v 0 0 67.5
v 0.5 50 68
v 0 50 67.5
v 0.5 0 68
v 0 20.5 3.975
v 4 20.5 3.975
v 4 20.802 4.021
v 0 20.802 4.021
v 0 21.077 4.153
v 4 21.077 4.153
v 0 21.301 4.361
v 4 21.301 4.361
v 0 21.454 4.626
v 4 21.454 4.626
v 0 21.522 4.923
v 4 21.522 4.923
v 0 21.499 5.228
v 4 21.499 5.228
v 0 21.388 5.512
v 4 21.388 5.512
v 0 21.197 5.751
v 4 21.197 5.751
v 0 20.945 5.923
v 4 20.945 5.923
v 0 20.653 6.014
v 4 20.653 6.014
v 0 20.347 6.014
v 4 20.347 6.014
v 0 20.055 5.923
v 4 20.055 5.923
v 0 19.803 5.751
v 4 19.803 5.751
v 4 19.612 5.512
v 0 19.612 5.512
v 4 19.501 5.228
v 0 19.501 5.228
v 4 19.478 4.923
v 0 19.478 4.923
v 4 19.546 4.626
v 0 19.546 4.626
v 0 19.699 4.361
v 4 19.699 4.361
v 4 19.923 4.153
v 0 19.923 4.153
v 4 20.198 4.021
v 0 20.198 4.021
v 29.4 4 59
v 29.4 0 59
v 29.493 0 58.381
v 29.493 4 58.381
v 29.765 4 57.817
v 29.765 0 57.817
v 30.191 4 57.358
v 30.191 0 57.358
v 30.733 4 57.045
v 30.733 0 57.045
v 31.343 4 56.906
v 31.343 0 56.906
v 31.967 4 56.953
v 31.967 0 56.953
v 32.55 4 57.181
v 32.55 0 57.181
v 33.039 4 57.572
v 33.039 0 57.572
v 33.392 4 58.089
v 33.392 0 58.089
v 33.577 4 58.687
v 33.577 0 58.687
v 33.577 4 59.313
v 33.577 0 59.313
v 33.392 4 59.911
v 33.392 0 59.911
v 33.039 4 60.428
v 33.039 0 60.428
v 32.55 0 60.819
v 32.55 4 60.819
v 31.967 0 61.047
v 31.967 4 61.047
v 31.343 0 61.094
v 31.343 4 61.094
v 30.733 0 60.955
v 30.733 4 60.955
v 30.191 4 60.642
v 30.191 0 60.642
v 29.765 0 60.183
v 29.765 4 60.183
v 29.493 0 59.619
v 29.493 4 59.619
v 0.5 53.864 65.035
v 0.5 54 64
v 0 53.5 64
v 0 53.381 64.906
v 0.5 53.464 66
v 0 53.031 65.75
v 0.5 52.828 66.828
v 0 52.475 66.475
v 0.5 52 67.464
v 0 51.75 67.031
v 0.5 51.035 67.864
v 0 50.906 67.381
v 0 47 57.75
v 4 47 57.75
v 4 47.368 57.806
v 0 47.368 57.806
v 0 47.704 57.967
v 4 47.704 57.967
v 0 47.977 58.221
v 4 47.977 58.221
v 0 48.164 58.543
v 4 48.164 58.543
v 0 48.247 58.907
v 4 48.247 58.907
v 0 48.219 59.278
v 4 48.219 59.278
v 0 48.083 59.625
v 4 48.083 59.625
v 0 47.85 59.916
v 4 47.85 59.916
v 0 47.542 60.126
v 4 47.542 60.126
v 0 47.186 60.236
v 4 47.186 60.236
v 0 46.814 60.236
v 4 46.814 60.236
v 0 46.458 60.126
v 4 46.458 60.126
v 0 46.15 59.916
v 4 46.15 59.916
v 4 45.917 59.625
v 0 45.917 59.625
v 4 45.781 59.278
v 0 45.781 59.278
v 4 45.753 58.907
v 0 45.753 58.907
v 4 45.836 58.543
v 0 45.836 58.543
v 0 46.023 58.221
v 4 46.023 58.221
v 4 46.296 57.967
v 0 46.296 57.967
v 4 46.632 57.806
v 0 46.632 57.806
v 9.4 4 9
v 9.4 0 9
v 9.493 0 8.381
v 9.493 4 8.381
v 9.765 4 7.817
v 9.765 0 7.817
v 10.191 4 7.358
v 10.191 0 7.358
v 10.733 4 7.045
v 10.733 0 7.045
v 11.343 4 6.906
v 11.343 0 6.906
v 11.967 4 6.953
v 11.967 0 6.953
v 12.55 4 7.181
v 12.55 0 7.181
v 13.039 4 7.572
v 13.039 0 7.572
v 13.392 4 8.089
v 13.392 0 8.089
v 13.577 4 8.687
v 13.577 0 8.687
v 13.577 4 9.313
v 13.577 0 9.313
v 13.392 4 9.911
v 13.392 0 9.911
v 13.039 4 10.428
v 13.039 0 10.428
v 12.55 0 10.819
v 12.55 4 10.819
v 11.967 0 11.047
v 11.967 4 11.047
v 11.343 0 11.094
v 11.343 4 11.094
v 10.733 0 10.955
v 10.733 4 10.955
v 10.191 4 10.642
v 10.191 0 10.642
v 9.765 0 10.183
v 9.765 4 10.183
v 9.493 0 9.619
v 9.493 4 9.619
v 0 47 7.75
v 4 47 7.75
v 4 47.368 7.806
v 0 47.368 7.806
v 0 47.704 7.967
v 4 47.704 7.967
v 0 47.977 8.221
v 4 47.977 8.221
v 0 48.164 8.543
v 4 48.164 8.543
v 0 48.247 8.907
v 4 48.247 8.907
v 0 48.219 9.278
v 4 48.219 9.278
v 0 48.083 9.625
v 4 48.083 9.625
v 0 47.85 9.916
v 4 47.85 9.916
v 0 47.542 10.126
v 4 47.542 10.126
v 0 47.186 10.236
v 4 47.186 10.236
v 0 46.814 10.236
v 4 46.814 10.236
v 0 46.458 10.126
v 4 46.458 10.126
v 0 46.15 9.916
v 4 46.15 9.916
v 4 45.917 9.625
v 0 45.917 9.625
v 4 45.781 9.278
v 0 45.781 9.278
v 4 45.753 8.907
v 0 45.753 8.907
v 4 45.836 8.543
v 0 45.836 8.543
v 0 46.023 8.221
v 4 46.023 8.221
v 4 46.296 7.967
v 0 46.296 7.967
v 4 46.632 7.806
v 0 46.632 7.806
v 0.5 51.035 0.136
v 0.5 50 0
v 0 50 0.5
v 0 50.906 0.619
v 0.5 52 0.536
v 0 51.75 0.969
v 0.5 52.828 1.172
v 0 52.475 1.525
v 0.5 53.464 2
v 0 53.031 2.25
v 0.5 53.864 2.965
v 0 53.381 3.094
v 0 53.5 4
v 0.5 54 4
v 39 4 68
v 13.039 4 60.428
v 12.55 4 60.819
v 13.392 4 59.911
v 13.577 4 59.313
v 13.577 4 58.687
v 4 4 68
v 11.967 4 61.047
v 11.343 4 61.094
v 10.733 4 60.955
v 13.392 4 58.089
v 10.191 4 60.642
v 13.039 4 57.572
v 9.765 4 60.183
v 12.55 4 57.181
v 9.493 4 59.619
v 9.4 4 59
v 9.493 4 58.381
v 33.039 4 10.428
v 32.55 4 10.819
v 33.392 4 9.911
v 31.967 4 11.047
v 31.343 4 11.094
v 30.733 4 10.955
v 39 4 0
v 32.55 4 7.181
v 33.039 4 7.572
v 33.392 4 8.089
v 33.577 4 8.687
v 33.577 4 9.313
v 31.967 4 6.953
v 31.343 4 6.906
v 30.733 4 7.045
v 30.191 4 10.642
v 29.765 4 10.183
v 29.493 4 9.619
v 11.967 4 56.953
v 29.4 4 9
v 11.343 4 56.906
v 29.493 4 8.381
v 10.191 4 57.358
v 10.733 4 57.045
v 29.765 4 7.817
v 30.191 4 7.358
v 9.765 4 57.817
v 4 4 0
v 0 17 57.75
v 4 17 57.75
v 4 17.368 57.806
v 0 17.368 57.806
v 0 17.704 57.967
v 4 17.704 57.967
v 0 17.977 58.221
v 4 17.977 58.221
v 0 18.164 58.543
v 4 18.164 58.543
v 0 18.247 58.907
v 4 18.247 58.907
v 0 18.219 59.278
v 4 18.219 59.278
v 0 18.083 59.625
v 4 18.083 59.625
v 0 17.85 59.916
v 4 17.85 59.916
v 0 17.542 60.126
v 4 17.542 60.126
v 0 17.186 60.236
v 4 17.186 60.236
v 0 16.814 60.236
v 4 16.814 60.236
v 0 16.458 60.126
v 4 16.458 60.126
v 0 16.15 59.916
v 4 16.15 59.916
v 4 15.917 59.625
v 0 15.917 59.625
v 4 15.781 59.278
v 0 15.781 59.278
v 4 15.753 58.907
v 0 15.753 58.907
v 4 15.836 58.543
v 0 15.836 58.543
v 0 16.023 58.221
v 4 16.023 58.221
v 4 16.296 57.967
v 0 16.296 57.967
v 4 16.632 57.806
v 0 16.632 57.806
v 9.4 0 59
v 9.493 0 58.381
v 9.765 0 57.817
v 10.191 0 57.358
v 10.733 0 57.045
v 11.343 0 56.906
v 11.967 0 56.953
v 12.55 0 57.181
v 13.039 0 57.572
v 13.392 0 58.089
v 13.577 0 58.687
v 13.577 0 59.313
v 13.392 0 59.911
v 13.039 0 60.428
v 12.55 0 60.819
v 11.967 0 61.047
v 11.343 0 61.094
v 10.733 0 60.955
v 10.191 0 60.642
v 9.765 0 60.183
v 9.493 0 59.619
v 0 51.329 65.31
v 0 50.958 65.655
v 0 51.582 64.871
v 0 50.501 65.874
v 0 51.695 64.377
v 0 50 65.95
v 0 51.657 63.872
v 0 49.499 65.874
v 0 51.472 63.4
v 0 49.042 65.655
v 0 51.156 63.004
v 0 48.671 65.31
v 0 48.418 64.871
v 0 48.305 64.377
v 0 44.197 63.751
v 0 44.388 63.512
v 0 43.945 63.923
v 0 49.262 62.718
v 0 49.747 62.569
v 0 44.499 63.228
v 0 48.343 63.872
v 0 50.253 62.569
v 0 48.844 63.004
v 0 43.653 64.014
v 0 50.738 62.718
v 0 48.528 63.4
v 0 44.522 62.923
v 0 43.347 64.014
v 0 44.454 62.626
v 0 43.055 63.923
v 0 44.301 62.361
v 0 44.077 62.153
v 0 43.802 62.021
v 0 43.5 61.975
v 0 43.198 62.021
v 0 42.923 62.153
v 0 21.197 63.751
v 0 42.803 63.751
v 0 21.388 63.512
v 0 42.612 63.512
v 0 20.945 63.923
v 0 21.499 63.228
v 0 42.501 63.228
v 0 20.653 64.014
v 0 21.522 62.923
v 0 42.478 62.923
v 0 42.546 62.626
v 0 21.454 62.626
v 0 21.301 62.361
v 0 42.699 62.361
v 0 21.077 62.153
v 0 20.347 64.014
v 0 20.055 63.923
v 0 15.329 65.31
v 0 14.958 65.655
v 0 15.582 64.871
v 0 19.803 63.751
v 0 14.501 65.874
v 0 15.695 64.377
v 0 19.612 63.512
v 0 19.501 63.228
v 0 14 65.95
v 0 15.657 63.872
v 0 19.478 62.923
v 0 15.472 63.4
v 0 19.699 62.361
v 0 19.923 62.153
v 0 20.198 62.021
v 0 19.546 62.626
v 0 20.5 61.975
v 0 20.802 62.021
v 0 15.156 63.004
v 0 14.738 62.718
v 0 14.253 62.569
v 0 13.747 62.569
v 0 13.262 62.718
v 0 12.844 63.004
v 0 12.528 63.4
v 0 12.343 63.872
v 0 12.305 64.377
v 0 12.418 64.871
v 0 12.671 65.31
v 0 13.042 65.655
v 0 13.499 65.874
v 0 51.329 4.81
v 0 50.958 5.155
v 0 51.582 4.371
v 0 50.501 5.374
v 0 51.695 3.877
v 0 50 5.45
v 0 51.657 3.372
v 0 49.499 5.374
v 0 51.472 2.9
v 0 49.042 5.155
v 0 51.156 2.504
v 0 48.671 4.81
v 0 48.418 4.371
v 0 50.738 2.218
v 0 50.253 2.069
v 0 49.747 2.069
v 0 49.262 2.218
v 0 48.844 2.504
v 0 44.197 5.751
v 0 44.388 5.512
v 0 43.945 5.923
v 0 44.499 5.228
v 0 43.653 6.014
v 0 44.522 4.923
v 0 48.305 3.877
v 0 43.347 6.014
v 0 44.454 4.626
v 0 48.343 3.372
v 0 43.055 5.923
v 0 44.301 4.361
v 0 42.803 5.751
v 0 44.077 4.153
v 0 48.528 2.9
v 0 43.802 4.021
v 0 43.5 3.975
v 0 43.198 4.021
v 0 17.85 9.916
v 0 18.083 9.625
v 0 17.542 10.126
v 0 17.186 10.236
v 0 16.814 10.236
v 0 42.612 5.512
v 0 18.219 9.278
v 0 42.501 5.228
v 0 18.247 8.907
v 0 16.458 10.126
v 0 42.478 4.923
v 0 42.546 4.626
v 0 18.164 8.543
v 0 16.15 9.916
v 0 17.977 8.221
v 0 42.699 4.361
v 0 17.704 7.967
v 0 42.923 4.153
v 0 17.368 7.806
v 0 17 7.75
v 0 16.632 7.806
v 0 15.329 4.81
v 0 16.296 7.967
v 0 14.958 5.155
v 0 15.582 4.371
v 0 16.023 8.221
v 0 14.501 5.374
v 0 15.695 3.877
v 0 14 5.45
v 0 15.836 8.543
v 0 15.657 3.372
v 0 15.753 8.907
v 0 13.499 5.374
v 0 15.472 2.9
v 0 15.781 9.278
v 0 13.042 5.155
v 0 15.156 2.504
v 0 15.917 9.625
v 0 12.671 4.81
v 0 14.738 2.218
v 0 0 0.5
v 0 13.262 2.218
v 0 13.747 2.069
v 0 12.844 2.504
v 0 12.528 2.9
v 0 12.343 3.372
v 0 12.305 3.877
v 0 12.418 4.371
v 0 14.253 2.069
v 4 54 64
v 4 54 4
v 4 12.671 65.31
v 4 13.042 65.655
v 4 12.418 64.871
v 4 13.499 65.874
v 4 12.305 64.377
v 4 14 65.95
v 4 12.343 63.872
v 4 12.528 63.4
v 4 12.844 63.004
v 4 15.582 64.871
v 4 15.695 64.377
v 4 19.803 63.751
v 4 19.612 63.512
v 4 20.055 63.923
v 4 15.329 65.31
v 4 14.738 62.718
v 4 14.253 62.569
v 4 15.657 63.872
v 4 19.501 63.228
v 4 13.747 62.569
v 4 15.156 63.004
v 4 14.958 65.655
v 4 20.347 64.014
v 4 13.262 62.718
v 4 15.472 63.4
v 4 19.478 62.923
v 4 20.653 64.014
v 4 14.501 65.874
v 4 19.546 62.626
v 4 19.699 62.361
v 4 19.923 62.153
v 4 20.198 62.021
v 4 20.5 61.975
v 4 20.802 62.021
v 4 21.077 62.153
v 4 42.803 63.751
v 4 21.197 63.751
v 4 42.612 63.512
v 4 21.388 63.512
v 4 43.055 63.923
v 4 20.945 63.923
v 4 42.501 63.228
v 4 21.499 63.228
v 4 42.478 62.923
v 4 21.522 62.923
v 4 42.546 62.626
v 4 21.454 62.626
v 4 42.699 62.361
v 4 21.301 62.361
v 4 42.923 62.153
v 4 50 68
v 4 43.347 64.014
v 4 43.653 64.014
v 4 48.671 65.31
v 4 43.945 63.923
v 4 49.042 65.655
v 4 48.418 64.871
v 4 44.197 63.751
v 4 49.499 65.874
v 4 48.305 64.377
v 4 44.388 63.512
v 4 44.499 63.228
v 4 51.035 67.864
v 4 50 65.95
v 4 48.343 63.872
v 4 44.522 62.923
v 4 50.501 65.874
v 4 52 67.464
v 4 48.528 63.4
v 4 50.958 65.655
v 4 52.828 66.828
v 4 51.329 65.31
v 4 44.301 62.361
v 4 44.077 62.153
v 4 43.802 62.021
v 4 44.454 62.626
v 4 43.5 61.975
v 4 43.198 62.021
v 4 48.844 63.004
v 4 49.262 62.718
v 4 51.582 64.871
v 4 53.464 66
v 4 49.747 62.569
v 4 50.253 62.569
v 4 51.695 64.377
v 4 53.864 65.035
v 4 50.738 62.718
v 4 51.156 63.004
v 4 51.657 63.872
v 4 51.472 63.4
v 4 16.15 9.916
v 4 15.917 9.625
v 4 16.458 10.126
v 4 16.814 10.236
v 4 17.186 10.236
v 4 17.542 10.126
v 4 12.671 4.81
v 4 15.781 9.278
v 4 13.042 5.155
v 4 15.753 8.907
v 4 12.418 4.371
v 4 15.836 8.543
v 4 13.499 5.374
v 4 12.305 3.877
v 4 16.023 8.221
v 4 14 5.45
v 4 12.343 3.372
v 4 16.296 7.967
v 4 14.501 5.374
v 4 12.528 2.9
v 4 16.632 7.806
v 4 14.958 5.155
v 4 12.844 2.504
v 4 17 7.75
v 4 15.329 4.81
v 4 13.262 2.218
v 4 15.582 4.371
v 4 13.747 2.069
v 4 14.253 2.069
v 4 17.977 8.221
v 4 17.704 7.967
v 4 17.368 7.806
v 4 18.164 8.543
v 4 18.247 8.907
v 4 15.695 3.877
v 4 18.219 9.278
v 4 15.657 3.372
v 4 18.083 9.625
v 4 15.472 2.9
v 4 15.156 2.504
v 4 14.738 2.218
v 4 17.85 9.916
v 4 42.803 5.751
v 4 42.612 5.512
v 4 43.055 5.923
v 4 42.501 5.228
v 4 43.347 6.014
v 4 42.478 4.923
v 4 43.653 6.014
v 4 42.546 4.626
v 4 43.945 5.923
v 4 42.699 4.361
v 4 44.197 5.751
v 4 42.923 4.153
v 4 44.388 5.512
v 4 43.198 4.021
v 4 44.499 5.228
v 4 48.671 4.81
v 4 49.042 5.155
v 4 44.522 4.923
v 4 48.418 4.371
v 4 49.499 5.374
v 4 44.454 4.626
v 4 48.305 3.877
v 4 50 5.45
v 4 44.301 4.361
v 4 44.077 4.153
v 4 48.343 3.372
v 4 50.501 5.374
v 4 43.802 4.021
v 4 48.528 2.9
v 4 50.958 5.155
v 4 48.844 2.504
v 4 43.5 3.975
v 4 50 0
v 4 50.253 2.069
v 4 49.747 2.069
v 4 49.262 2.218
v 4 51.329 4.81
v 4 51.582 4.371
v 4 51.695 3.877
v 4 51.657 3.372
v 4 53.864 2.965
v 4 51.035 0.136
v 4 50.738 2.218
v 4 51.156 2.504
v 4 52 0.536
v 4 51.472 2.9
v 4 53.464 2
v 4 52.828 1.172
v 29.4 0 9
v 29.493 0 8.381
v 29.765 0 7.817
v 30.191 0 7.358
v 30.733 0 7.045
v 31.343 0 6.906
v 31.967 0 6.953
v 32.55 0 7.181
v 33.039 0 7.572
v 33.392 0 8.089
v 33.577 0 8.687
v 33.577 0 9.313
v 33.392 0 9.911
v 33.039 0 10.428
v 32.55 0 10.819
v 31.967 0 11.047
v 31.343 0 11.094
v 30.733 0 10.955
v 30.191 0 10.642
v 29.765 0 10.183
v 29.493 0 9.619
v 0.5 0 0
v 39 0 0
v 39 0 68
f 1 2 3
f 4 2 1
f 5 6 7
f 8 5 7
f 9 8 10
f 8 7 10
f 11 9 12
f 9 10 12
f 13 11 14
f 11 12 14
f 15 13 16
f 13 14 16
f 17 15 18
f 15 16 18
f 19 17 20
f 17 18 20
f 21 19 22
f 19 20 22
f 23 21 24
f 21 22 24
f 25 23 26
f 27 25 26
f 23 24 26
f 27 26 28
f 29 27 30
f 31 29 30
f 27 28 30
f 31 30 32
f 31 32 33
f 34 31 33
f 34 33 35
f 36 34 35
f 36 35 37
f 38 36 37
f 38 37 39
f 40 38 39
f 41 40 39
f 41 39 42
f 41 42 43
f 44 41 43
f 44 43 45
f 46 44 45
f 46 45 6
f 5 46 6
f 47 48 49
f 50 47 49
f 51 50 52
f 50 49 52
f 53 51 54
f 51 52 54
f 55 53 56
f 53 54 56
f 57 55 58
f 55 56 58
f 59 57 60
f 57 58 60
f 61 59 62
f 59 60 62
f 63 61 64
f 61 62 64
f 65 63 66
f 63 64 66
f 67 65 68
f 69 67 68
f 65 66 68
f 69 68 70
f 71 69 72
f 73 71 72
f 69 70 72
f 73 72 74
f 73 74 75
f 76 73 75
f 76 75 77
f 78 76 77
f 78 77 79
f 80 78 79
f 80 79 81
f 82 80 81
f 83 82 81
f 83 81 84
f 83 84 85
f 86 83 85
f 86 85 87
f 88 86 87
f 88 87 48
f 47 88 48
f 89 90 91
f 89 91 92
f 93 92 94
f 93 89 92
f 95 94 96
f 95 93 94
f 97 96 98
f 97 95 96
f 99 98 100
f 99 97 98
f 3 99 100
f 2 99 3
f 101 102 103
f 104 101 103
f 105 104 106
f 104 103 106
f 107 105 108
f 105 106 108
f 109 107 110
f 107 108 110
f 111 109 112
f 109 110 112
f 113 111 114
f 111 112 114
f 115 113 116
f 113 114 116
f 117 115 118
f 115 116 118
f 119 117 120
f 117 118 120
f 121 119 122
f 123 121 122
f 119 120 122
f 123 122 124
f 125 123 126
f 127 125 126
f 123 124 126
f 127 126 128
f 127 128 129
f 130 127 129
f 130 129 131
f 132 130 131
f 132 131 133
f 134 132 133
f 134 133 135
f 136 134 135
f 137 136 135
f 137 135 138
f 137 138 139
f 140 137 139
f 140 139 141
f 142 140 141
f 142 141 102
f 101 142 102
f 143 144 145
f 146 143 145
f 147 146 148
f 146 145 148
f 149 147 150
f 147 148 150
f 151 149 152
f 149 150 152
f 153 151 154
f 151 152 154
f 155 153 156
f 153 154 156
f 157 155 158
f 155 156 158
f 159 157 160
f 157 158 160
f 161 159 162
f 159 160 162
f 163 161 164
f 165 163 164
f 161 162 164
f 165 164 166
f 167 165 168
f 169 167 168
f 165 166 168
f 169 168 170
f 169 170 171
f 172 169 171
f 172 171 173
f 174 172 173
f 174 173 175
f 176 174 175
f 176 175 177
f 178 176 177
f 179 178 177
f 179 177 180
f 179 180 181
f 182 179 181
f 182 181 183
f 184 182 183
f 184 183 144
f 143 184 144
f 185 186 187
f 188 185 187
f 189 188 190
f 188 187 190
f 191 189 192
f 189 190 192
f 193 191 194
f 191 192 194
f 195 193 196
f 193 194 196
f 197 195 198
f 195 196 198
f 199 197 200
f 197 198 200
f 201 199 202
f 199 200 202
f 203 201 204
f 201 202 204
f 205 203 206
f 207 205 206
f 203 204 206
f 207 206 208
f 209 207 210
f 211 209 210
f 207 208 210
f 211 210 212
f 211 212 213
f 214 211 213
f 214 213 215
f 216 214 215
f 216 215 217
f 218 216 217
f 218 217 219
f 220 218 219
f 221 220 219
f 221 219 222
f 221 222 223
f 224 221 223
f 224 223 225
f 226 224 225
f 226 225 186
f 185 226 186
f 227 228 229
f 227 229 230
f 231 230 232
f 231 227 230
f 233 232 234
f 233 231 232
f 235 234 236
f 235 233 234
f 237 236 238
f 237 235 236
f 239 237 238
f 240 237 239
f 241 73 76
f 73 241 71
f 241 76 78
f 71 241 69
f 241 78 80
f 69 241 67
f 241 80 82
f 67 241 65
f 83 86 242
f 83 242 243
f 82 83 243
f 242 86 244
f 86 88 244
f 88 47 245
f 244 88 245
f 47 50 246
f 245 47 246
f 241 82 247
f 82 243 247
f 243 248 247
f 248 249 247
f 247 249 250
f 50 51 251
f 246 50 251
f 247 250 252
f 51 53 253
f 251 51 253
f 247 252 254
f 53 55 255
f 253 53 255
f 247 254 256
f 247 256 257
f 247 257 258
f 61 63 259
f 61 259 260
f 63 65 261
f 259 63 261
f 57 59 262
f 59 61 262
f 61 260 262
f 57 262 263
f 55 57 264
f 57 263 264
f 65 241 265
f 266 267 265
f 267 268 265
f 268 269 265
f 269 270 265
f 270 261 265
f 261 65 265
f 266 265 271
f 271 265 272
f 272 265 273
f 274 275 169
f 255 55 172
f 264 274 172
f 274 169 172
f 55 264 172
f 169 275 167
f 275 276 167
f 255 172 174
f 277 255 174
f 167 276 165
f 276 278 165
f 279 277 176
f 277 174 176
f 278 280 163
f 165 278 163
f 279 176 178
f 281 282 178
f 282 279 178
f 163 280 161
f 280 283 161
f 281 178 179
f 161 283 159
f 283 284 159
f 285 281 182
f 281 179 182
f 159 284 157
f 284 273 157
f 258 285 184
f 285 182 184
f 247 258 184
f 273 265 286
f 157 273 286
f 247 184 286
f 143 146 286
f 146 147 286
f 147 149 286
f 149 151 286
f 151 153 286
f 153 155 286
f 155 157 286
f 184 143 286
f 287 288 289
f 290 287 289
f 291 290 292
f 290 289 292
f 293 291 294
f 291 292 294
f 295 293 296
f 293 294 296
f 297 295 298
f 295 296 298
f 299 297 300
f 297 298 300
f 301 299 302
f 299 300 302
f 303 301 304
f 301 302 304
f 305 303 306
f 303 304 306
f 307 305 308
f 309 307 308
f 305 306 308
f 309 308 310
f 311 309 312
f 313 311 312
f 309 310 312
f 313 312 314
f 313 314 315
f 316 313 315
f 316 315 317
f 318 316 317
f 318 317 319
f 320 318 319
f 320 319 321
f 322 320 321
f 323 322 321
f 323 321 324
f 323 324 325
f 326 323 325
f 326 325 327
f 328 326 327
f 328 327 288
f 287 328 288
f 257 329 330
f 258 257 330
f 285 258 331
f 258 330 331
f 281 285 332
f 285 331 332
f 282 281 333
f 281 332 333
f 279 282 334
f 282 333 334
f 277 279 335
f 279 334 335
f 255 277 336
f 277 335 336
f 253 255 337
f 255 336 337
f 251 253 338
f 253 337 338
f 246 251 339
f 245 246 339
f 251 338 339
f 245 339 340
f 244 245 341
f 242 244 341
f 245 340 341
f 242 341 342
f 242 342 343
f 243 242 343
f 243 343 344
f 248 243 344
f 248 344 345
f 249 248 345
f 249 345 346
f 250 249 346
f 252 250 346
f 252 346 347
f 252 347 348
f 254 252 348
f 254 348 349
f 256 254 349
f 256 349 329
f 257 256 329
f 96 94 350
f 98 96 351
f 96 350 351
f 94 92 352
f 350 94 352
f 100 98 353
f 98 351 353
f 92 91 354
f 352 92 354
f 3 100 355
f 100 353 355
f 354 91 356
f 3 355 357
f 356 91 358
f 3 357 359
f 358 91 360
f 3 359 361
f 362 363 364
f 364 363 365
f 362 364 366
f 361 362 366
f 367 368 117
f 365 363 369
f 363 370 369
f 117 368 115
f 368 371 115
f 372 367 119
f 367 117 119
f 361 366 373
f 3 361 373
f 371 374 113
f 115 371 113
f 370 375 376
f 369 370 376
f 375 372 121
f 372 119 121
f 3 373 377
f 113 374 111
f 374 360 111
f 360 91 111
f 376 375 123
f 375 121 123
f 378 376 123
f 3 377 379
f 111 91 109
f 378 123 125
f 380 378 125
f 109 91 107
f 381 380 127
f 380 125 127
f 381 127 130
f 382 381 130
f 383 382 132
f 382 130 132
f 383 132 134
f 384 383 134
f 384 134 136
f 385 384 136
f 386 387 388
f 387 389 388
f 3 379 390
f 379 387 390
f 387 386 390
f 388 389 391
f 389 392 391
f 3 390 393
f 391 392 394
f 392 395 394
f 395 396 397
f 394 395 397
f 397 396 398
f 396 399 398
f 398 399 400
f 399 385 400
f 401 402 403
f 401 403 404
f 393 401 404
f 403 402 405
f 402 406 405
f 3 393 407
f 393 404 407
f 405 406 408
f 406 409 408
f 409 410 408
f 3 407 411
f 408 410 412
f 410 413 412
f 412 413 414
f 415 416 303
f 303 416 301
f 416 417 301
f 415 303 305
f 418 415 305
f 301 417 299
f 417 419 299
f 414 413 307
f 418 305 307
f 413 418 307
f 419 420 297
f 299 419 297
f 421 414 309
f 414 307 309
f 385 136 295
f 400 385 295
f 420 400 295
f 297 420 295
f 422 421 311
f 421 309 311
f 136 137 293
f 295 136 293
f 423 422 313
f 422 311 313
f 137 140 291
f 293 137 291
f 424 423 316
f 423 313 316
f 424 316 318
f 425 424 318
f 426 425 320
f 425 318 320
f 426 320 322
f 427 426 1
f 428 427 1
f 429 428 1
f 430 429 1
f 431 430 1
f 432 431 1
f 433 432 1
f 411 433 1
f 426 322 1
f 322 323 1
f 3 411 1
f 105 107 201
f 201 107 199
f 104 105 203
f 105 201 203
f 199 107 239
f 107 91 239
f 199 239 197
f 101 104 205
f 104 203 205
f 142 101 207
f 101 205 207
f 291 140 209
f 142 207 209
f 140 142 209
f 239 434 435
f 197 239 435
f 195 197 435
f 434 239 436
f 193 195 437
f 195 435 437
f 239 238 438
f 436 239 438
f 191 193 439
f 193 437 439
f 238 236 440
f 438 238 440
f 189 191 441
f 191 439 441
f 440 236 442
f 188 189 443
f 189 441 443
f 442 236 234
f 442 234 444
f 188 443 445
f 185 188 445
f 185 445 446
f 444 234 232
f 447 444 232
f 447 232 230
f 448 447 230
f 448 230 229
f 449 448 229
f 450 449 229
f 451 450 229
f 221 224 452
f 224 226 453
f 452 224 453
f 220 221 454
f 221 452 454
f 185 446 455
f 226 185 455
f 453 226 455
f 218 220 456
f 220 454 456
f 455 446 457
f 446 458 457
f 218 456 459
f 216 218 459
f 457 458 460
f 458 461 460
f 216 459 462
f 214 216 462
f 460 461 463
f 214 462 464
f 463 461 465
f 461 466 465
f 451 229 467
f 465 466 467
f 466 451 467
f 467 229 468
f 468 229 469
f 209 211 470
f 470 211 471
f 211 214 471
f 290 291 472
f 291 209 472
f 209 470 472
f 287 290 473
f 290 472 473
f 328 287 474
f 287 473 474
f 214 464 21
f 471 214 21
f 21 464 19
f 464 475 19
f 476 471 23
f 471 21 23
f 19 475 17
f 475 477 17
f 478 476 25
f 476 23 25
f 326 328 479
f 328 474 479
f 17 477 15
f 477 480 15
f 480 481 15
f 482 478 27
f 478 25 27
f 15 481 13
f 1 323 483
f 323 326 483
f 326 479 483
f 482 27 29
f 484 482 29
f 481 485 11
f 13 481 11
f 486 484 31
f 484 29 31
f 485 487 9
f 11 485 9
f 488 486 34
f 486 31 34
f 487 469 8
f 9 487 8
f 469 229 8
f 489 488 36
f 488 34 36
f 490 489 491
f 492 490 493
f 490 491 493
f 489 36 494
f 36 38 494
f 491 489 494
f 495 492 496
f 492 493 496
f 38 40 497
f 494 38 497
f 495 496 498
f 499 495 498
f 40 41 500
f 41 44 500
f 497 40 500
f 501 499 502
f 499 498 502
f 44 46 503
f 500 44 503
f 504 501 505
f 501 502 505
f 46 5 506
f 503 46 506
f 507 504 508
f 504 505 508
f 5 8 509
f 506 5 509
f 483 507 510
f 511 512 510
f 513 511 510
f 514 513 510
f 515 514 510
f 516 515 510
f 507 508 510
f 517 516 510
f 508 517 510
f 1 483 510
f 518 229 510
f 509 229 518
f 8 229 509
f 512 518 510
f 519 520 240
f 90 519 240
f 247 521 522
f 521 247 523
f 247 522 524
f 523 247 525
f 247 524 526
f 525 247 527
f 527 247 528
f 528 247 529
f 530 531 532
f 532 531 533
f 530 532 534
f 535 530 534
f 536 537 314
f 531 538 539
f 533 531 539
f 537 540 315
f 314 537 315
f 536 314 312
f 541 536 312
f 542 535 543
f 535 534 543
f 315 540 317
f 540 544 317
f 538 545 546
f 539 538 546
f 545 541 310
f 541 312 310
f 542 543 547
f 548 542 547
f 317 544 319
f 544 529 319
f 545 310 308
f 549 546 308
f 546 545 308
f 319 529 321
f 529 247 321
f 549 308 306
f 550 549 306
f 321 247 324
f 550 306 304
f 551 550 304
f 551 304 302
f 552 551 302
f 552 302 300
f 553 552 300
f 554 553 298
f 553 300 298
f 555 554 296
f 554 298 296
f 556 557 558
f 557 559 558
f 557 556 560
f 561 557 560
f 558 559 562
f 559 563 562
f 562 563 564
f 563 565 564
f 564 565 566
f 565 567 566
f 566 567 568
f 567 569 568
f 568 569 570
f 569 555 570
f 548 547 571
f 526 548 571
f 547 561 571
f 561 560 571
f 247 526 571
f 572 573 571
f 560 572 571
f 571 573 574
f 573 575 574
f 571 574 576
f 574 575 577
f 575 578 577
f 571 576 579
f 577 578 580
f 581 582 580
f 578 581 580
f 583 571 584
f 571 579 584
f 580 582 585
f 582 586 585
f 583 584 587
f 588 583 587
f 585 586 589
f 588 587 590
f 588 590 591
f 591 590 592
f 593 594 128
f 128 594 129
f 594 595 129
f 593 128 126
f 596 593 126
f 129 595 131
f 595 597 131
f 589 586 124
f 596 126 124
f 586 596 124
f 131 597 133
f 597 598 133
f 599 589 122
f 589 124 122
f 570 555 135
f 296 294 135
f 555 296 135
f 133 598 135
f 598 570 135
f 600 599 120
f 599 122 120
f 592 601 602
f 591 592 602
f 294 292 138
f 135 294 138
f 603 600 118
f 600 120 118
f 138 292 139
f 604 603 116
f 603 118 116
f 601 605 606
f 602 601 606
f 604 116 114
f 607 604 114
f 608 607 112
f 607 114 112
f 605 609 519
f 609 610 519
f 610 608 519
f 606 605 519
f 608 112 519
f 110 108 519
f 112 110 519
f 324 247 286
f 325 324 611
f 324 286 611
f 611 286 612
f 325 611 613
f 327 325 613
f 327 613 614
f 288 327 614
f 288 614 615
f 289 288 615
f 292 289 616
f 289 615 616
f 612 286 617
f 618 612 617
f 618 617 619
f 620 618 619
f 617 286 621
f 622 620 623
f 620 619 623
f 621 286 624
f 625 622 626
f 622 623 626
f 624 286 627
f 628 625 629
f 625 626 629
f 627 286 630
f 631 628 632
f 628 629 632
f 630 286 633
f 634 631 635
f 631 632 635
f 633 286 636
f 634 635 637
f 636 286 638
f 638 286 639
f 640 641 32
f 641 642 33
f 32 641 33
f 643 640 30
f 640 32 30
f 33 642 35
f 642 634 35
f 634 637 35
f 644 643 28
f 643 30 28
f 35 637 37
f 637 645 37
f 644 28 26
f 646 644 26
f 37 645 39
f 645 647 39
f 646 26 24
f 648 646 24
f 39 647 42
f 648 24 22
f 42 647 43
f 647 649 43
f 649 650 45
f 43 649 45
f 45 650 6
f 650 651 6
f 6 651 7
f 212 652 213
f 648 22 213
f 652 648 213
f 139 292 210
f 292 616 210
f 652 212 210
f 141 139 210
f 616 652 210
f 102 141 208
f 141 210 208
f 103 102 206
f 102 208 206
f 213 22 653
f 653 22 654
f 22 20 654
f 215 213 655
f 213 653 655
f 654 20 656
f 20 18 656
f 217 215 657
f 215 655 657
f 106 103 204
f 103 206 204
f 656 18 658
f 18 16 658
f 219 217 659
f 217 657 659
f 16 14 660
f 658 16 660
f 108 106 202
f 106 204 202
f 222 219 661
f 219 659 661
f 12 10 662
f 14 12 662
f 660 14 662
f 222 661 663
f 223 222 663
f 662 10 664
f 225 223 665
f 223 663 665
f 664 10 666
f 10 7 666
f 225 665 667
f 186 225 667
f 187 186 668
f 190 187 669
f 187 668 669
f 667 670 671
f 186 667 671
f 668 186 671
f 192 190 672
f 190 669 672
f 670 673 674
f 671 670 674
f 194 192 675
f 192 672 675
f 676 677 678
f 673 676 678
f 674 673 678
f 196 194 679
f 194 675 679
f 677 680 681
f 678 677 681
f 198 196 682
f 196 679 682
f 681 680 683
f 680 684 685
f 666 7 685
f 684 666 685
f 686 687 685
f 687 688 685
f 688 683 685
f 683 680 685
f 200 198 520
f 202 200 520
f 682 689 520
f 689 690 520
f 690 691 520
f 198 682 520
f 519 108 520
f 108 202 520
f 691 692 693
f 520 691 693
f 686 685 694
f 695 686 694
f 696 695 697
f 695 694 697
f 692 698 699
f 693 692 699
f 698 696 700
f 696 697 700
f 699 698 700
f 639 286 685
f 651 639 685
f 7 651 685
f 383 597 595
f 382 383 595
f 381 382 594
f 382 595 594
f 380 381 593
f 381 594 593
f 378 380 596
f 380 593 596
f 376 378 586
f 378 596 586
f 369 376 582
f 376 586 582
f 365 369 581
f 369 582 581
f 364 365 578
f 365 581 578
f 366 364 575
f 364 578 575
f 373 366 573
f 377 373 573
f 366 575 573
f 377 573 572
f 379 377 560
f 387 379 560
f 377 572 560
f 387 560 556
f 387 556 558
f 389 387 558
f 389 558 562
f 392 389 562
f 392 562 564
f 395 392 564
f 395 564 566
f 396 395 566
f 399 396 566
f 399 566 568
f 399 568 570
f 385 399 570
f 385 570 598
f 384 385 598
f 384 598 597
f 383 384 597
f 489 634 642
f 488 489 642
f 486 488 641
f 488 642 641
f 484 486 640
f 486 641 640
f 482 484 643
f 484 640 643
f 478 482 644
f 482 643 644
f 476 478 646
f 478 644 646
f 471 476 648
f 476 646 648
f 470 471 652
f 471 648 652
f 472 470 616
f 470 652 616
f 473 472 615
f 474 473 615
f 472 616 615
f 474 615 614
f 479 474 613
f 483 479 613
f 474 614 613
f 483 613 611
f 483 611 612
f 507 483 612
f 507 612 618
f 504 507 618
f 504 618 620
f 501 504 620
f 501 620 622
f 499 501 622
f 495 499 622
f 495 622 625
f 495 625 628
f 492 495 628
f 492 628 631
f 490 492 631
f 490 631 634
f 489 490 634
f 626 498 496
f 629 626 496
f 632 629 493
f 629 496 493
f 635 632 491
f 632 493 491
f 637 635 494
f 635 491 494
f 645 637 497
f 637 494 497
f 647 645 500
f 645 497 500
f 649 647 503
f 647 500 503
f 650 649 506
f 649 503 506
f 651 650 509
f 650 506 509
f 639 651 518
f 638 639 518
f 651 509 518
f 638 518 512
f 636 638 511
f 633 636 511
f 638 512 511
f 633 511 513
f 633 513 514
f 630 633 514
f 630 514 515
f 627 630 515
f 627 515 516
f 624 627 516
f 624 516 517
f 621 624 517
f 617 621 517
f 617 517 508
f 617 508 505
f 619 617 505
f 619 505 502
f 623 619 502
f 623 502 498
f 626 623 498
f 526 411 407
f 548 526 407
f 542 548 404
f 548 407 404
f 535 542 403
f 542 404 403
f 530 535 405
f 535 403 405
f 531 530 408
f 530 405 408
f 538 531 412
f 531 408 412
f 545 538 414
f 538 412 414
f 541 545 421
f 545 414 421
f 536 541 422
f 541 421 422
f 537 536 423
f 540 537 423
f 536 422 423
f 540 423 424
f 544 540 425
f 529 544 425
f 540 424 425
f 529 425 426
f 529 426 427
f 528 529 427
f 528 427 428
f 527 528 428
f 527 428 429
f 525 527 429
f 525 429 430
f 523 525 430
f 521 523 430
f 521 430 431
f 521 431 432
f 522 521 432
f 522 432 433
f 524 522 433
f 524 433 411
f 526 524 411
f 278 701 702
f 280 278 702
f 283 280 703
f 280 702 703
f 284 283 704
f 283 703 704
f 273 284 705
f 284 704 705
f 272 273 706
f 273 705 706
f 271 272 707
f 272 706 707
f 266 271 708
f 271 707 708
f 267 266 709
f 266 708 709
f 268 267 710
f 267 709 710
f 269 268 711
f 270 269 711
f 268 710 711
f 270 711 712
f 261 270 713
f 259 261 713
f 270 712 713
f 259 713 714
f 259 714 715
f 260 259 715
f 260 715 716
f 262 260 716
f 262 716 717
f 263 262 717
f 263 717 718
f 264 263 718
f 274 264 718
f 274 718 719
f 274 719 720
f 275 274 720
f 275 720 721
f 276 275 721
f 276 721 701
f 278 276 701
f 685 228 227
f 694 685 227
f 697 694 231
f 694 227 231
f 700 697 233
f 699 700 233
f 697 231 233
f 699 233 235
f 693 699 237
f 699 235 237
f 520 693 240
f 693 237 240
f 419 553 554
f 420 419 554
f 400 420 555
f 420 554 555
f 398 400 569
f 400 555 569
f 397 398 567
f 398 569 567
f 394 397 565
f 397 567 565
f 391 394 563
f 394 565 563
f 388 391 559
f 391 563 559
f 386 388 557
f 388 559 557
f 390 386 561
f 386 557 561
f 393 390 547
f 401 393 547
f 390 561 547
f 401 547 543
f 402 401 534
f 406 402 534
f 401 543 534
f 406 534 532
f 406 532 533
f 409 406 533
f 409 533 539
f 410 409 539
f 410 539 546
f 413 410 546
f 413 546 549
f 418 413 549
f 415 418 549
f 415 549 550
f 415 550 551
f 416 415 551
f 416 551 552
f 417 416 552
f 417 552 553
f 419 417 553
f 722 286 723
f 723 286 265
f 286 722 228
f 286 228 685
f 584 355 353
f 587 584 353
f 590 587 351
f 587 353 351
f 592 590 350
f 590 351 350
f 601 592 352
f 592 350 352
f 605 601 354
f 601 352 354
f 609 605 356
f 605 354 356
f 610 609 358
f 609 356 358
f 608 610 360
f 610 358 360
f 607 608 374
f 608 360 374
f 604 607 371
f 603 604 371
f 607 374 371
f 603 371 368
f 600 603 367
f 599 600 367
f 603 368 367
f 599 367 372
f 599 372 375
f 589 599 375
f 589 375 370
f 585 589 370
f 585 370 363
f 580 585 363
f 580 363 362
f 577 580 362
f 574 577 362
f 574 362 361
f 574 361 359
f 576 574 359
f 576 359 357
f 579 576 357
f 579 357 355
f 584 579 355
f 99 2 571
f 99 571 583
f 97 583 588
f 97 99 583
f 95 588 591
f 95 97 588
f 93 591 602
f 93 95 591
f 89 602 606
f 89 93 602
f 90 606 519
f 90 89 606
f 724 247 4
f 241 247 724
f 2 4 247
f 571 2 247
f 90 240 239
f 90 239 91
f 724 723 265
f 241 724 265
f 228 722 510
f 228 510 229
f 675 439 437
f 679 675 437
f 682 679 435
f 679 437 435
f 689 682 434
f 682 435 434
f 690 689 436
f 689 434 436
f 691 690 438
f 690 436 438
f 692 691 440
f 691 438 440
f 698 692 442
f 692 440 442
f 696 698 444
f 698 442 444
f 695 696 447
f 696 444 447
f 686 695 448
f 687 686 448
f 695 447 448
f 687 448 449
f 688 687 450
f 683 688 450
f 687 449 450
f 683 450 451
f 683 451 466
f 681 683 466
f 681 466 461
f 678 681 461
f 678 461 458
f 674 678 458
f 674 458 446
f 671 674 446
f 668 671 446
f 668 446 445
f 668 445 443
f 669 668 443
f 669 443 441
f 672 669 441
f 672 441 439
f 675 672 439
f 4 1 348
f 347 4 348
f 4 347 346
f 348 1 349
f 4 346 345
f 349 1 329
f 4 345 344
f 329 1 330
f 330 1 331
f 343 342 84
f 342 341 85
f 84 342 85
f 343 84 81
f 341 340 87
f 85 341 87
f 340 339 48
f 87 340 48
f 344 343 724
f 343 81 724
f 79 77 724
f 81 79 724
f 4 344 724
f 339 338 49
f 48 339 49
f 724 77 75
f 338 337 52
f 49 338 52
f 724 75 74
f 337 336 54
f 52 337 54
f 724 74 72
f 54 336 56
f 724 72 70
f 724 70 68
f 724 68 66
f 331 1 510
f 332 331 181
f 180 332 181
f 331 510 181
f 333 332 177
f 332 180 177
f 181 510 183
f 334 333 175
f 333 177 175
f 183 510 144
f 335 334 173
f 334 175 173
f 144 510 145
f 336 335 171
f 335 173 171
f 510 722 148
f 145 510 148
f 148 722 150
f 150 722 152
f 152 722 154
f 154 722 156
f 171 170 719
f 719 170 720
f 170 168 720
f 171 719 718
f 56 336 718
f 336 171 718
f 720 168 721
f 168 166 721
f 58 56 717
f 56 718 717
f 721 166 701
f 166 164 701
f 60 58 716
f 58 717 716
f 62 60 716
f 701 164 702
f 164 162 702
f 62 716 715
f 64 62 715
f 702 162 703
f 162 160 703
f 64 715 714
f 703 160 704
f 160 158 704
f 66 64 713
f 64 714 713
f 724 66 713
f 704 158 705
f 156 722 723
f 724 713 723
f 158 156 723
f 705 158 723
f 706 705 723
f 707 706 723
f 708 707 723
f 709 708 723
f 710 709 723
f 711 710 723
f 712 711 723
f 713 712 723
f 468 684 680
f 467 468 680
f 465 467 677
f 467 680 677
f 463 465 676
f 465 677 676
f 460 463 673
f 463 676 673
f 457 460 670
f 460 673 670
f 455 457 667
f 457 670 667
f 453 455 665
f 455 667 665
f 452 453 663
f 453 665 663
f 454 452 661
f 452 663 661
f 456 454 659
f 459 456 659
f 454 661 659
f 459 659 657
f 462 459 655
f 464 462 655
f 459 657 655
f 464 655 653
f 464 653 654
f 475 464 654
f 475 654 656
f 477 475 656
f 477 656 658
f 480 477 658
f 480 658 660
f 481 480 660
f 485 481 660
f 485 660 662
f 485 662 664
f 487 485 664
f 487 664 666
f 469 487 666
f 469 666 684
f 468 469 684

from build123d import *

# Parameters (mm, degrees)
BOSS_EXTRUDE1_DEPTH          = 68
M3_CLEARANCE_HOLE1_D         = 3.4
M3_CLEARANCE_HOLE1_DEPTH     = 5
M3_CLEARANCE_HOLE1_TIP       = 1.021463052
M5X0_8_TAPPED_HOLE1_D        = 4.2
M5X0_8_TAPPED_HOLE1_DEPTH    = 14
M5X0_8_TAPPED_HOLE1_TIP      = 1.2618073
FILLET1_R                    = 4
CHAMFER1_SIZE                = 0.5
M2_5X0_45_TAPPED_HOLE1_D     = 2.05
M2_5X0_45_TAPPED_HOLE1_DEPTH = 7.25
M2_5X0_45_TAPPED_HOLE1_TIP   = 0.615882135
M3X0_5_TAPPED_HOLE3_D        = 2.5
M3X0_5_TAPPED_HOLE3_DEPTH    = 8.5
M3X0_5_TAPPED_HOLE3_TIP      = 0.751075774


with BuildPart() as part:
    # Sketch1 → Boss-Extrude1 (new body)
    with BuildSketch(Plane.XY):
        Polygon((0, 0), (39, 0), (39, 4), (4, 4), (4, 54), (0, 54), align=None)
    extrude(amount=BOSS_EXTRUDE1_DEPTH)

    # M3 Clearance Hole1
    with Locations(Plane(origin=(4, 0, 0), x_dir=(0, 0, -1), z_dir=(1, 0, 0))):
        with Locations((-64.25, 50), (-3.75, 50), (-3.75, 14), (-64.25, 14)):
            Hole(M3_CLEARANCE_HOLE1_D / 2, depth=M3_CLEARANCE_HOLE1_DEPTH)
            with Locations((0, 0, -(M3_CLEARANCE_HOLE1_DEPTH + M3_CLEARANCE_HOLE1_TIP / 2))):  # 118° drill point
                Cone(0, M3_CLEARANCE_HOLE1_D / 2, M3_CLEARANCE_HOLE1_TIP, mode=Mode.SUBTRACT)

    # M5x0.8 Tapped Hole1
    with Locations(Plane(origin=(0, 4, 0), x_dir=(1, 0, 0), z_dir=(0, 1, 0))):
        with Locations((31.5, -59), (11.5, -59), (11.5, -9), (31.5, -9)):
            Hole(M5X0_8_TAPPED_HOLE1_D / 2, depth=M5X0_8_TAPPED_HOLE1_DEPTH)
            with Locations((0, 0, -(M5X0_8_TAPPED_HOLE1_DEPTH + M5X0_8_TAPPED_HOLE1_TIP / 2))):  # 118° drill point
                Cone(0, M5X0_8_TAPPED_HOLE1_D / 2, M5X0_8_TAPPED_HOLE1_TIP, mode=Mode.SUBTRACT)

    # Fillet1
    fillet1_edges = [part.edges().sort_by_distance(p)[0] for p in [
        (2, 54, 68),
        (2, 54, 0),
    ]]
    fillet(fillet1_edges, radius=FILLET1_R)

    # Chamfer1
    chamfer1_edges = [part.edges().sort_by_distance(p)[0] for p in [
        (0, 25, 68),
        (0, 25, 0),
        (0, 54, 34),
        (0, 52.828427125, 1.171572875),
        (0, 52.828427125, 66.828427125),
    ]]
    chamfer(chamfer1_edges, length=CHAMFER1_SIZE)

    # M2.5x0.45 Tapped Hole1
    with Locations(Plane.ZY):
        with Locations((5, 43.5), (63, 43.5), (63, 20.5), (5, 20.5)):
            Hole(M2_5X0_45_TAPPED_HOLE1_D / 2, depth=M2_5X0_45_TAPPED_HOLE1_DEPTH)
            with Locations((0, 0, -(M2_5X0_45_TAPPED_HOLE1_DEPTH + M2_5X0_45_TAPPED_HOLE1_TIP / 2))):  # 118° drill point
                Cone(0, M2_5X0_45_TAPPED_HOLE1_D / 2, M2_5X0_45_TAPPED_HOLE1_TIP, mode=Mode.SUBTRACT)

    # M3x0.5 Tapped Hole3
    with Locations(Plane.ZY):
        with Locations((9, 17), (9, 47), (59, 47), (59, 17)):
            Hole(M3X0_5_TAPPED_HOLE3_D / 2, depth=M3X0_5_TAPPED_HOLE3_DEPTH)
            with Locations((0, 0, -(M3X0_5_TAPPED_HOLE3_DEPTH + M3X0_5_TAPPED_HOLE3_TIP / 2))):  # 118° drill point
                Cone(0, M3X0_5_TAPPED_HOLE3_D / 2, M3X0_5_TAPPED_HOLE3_TIP, mode=Mode.SUBTRACT)


solid = part.part
